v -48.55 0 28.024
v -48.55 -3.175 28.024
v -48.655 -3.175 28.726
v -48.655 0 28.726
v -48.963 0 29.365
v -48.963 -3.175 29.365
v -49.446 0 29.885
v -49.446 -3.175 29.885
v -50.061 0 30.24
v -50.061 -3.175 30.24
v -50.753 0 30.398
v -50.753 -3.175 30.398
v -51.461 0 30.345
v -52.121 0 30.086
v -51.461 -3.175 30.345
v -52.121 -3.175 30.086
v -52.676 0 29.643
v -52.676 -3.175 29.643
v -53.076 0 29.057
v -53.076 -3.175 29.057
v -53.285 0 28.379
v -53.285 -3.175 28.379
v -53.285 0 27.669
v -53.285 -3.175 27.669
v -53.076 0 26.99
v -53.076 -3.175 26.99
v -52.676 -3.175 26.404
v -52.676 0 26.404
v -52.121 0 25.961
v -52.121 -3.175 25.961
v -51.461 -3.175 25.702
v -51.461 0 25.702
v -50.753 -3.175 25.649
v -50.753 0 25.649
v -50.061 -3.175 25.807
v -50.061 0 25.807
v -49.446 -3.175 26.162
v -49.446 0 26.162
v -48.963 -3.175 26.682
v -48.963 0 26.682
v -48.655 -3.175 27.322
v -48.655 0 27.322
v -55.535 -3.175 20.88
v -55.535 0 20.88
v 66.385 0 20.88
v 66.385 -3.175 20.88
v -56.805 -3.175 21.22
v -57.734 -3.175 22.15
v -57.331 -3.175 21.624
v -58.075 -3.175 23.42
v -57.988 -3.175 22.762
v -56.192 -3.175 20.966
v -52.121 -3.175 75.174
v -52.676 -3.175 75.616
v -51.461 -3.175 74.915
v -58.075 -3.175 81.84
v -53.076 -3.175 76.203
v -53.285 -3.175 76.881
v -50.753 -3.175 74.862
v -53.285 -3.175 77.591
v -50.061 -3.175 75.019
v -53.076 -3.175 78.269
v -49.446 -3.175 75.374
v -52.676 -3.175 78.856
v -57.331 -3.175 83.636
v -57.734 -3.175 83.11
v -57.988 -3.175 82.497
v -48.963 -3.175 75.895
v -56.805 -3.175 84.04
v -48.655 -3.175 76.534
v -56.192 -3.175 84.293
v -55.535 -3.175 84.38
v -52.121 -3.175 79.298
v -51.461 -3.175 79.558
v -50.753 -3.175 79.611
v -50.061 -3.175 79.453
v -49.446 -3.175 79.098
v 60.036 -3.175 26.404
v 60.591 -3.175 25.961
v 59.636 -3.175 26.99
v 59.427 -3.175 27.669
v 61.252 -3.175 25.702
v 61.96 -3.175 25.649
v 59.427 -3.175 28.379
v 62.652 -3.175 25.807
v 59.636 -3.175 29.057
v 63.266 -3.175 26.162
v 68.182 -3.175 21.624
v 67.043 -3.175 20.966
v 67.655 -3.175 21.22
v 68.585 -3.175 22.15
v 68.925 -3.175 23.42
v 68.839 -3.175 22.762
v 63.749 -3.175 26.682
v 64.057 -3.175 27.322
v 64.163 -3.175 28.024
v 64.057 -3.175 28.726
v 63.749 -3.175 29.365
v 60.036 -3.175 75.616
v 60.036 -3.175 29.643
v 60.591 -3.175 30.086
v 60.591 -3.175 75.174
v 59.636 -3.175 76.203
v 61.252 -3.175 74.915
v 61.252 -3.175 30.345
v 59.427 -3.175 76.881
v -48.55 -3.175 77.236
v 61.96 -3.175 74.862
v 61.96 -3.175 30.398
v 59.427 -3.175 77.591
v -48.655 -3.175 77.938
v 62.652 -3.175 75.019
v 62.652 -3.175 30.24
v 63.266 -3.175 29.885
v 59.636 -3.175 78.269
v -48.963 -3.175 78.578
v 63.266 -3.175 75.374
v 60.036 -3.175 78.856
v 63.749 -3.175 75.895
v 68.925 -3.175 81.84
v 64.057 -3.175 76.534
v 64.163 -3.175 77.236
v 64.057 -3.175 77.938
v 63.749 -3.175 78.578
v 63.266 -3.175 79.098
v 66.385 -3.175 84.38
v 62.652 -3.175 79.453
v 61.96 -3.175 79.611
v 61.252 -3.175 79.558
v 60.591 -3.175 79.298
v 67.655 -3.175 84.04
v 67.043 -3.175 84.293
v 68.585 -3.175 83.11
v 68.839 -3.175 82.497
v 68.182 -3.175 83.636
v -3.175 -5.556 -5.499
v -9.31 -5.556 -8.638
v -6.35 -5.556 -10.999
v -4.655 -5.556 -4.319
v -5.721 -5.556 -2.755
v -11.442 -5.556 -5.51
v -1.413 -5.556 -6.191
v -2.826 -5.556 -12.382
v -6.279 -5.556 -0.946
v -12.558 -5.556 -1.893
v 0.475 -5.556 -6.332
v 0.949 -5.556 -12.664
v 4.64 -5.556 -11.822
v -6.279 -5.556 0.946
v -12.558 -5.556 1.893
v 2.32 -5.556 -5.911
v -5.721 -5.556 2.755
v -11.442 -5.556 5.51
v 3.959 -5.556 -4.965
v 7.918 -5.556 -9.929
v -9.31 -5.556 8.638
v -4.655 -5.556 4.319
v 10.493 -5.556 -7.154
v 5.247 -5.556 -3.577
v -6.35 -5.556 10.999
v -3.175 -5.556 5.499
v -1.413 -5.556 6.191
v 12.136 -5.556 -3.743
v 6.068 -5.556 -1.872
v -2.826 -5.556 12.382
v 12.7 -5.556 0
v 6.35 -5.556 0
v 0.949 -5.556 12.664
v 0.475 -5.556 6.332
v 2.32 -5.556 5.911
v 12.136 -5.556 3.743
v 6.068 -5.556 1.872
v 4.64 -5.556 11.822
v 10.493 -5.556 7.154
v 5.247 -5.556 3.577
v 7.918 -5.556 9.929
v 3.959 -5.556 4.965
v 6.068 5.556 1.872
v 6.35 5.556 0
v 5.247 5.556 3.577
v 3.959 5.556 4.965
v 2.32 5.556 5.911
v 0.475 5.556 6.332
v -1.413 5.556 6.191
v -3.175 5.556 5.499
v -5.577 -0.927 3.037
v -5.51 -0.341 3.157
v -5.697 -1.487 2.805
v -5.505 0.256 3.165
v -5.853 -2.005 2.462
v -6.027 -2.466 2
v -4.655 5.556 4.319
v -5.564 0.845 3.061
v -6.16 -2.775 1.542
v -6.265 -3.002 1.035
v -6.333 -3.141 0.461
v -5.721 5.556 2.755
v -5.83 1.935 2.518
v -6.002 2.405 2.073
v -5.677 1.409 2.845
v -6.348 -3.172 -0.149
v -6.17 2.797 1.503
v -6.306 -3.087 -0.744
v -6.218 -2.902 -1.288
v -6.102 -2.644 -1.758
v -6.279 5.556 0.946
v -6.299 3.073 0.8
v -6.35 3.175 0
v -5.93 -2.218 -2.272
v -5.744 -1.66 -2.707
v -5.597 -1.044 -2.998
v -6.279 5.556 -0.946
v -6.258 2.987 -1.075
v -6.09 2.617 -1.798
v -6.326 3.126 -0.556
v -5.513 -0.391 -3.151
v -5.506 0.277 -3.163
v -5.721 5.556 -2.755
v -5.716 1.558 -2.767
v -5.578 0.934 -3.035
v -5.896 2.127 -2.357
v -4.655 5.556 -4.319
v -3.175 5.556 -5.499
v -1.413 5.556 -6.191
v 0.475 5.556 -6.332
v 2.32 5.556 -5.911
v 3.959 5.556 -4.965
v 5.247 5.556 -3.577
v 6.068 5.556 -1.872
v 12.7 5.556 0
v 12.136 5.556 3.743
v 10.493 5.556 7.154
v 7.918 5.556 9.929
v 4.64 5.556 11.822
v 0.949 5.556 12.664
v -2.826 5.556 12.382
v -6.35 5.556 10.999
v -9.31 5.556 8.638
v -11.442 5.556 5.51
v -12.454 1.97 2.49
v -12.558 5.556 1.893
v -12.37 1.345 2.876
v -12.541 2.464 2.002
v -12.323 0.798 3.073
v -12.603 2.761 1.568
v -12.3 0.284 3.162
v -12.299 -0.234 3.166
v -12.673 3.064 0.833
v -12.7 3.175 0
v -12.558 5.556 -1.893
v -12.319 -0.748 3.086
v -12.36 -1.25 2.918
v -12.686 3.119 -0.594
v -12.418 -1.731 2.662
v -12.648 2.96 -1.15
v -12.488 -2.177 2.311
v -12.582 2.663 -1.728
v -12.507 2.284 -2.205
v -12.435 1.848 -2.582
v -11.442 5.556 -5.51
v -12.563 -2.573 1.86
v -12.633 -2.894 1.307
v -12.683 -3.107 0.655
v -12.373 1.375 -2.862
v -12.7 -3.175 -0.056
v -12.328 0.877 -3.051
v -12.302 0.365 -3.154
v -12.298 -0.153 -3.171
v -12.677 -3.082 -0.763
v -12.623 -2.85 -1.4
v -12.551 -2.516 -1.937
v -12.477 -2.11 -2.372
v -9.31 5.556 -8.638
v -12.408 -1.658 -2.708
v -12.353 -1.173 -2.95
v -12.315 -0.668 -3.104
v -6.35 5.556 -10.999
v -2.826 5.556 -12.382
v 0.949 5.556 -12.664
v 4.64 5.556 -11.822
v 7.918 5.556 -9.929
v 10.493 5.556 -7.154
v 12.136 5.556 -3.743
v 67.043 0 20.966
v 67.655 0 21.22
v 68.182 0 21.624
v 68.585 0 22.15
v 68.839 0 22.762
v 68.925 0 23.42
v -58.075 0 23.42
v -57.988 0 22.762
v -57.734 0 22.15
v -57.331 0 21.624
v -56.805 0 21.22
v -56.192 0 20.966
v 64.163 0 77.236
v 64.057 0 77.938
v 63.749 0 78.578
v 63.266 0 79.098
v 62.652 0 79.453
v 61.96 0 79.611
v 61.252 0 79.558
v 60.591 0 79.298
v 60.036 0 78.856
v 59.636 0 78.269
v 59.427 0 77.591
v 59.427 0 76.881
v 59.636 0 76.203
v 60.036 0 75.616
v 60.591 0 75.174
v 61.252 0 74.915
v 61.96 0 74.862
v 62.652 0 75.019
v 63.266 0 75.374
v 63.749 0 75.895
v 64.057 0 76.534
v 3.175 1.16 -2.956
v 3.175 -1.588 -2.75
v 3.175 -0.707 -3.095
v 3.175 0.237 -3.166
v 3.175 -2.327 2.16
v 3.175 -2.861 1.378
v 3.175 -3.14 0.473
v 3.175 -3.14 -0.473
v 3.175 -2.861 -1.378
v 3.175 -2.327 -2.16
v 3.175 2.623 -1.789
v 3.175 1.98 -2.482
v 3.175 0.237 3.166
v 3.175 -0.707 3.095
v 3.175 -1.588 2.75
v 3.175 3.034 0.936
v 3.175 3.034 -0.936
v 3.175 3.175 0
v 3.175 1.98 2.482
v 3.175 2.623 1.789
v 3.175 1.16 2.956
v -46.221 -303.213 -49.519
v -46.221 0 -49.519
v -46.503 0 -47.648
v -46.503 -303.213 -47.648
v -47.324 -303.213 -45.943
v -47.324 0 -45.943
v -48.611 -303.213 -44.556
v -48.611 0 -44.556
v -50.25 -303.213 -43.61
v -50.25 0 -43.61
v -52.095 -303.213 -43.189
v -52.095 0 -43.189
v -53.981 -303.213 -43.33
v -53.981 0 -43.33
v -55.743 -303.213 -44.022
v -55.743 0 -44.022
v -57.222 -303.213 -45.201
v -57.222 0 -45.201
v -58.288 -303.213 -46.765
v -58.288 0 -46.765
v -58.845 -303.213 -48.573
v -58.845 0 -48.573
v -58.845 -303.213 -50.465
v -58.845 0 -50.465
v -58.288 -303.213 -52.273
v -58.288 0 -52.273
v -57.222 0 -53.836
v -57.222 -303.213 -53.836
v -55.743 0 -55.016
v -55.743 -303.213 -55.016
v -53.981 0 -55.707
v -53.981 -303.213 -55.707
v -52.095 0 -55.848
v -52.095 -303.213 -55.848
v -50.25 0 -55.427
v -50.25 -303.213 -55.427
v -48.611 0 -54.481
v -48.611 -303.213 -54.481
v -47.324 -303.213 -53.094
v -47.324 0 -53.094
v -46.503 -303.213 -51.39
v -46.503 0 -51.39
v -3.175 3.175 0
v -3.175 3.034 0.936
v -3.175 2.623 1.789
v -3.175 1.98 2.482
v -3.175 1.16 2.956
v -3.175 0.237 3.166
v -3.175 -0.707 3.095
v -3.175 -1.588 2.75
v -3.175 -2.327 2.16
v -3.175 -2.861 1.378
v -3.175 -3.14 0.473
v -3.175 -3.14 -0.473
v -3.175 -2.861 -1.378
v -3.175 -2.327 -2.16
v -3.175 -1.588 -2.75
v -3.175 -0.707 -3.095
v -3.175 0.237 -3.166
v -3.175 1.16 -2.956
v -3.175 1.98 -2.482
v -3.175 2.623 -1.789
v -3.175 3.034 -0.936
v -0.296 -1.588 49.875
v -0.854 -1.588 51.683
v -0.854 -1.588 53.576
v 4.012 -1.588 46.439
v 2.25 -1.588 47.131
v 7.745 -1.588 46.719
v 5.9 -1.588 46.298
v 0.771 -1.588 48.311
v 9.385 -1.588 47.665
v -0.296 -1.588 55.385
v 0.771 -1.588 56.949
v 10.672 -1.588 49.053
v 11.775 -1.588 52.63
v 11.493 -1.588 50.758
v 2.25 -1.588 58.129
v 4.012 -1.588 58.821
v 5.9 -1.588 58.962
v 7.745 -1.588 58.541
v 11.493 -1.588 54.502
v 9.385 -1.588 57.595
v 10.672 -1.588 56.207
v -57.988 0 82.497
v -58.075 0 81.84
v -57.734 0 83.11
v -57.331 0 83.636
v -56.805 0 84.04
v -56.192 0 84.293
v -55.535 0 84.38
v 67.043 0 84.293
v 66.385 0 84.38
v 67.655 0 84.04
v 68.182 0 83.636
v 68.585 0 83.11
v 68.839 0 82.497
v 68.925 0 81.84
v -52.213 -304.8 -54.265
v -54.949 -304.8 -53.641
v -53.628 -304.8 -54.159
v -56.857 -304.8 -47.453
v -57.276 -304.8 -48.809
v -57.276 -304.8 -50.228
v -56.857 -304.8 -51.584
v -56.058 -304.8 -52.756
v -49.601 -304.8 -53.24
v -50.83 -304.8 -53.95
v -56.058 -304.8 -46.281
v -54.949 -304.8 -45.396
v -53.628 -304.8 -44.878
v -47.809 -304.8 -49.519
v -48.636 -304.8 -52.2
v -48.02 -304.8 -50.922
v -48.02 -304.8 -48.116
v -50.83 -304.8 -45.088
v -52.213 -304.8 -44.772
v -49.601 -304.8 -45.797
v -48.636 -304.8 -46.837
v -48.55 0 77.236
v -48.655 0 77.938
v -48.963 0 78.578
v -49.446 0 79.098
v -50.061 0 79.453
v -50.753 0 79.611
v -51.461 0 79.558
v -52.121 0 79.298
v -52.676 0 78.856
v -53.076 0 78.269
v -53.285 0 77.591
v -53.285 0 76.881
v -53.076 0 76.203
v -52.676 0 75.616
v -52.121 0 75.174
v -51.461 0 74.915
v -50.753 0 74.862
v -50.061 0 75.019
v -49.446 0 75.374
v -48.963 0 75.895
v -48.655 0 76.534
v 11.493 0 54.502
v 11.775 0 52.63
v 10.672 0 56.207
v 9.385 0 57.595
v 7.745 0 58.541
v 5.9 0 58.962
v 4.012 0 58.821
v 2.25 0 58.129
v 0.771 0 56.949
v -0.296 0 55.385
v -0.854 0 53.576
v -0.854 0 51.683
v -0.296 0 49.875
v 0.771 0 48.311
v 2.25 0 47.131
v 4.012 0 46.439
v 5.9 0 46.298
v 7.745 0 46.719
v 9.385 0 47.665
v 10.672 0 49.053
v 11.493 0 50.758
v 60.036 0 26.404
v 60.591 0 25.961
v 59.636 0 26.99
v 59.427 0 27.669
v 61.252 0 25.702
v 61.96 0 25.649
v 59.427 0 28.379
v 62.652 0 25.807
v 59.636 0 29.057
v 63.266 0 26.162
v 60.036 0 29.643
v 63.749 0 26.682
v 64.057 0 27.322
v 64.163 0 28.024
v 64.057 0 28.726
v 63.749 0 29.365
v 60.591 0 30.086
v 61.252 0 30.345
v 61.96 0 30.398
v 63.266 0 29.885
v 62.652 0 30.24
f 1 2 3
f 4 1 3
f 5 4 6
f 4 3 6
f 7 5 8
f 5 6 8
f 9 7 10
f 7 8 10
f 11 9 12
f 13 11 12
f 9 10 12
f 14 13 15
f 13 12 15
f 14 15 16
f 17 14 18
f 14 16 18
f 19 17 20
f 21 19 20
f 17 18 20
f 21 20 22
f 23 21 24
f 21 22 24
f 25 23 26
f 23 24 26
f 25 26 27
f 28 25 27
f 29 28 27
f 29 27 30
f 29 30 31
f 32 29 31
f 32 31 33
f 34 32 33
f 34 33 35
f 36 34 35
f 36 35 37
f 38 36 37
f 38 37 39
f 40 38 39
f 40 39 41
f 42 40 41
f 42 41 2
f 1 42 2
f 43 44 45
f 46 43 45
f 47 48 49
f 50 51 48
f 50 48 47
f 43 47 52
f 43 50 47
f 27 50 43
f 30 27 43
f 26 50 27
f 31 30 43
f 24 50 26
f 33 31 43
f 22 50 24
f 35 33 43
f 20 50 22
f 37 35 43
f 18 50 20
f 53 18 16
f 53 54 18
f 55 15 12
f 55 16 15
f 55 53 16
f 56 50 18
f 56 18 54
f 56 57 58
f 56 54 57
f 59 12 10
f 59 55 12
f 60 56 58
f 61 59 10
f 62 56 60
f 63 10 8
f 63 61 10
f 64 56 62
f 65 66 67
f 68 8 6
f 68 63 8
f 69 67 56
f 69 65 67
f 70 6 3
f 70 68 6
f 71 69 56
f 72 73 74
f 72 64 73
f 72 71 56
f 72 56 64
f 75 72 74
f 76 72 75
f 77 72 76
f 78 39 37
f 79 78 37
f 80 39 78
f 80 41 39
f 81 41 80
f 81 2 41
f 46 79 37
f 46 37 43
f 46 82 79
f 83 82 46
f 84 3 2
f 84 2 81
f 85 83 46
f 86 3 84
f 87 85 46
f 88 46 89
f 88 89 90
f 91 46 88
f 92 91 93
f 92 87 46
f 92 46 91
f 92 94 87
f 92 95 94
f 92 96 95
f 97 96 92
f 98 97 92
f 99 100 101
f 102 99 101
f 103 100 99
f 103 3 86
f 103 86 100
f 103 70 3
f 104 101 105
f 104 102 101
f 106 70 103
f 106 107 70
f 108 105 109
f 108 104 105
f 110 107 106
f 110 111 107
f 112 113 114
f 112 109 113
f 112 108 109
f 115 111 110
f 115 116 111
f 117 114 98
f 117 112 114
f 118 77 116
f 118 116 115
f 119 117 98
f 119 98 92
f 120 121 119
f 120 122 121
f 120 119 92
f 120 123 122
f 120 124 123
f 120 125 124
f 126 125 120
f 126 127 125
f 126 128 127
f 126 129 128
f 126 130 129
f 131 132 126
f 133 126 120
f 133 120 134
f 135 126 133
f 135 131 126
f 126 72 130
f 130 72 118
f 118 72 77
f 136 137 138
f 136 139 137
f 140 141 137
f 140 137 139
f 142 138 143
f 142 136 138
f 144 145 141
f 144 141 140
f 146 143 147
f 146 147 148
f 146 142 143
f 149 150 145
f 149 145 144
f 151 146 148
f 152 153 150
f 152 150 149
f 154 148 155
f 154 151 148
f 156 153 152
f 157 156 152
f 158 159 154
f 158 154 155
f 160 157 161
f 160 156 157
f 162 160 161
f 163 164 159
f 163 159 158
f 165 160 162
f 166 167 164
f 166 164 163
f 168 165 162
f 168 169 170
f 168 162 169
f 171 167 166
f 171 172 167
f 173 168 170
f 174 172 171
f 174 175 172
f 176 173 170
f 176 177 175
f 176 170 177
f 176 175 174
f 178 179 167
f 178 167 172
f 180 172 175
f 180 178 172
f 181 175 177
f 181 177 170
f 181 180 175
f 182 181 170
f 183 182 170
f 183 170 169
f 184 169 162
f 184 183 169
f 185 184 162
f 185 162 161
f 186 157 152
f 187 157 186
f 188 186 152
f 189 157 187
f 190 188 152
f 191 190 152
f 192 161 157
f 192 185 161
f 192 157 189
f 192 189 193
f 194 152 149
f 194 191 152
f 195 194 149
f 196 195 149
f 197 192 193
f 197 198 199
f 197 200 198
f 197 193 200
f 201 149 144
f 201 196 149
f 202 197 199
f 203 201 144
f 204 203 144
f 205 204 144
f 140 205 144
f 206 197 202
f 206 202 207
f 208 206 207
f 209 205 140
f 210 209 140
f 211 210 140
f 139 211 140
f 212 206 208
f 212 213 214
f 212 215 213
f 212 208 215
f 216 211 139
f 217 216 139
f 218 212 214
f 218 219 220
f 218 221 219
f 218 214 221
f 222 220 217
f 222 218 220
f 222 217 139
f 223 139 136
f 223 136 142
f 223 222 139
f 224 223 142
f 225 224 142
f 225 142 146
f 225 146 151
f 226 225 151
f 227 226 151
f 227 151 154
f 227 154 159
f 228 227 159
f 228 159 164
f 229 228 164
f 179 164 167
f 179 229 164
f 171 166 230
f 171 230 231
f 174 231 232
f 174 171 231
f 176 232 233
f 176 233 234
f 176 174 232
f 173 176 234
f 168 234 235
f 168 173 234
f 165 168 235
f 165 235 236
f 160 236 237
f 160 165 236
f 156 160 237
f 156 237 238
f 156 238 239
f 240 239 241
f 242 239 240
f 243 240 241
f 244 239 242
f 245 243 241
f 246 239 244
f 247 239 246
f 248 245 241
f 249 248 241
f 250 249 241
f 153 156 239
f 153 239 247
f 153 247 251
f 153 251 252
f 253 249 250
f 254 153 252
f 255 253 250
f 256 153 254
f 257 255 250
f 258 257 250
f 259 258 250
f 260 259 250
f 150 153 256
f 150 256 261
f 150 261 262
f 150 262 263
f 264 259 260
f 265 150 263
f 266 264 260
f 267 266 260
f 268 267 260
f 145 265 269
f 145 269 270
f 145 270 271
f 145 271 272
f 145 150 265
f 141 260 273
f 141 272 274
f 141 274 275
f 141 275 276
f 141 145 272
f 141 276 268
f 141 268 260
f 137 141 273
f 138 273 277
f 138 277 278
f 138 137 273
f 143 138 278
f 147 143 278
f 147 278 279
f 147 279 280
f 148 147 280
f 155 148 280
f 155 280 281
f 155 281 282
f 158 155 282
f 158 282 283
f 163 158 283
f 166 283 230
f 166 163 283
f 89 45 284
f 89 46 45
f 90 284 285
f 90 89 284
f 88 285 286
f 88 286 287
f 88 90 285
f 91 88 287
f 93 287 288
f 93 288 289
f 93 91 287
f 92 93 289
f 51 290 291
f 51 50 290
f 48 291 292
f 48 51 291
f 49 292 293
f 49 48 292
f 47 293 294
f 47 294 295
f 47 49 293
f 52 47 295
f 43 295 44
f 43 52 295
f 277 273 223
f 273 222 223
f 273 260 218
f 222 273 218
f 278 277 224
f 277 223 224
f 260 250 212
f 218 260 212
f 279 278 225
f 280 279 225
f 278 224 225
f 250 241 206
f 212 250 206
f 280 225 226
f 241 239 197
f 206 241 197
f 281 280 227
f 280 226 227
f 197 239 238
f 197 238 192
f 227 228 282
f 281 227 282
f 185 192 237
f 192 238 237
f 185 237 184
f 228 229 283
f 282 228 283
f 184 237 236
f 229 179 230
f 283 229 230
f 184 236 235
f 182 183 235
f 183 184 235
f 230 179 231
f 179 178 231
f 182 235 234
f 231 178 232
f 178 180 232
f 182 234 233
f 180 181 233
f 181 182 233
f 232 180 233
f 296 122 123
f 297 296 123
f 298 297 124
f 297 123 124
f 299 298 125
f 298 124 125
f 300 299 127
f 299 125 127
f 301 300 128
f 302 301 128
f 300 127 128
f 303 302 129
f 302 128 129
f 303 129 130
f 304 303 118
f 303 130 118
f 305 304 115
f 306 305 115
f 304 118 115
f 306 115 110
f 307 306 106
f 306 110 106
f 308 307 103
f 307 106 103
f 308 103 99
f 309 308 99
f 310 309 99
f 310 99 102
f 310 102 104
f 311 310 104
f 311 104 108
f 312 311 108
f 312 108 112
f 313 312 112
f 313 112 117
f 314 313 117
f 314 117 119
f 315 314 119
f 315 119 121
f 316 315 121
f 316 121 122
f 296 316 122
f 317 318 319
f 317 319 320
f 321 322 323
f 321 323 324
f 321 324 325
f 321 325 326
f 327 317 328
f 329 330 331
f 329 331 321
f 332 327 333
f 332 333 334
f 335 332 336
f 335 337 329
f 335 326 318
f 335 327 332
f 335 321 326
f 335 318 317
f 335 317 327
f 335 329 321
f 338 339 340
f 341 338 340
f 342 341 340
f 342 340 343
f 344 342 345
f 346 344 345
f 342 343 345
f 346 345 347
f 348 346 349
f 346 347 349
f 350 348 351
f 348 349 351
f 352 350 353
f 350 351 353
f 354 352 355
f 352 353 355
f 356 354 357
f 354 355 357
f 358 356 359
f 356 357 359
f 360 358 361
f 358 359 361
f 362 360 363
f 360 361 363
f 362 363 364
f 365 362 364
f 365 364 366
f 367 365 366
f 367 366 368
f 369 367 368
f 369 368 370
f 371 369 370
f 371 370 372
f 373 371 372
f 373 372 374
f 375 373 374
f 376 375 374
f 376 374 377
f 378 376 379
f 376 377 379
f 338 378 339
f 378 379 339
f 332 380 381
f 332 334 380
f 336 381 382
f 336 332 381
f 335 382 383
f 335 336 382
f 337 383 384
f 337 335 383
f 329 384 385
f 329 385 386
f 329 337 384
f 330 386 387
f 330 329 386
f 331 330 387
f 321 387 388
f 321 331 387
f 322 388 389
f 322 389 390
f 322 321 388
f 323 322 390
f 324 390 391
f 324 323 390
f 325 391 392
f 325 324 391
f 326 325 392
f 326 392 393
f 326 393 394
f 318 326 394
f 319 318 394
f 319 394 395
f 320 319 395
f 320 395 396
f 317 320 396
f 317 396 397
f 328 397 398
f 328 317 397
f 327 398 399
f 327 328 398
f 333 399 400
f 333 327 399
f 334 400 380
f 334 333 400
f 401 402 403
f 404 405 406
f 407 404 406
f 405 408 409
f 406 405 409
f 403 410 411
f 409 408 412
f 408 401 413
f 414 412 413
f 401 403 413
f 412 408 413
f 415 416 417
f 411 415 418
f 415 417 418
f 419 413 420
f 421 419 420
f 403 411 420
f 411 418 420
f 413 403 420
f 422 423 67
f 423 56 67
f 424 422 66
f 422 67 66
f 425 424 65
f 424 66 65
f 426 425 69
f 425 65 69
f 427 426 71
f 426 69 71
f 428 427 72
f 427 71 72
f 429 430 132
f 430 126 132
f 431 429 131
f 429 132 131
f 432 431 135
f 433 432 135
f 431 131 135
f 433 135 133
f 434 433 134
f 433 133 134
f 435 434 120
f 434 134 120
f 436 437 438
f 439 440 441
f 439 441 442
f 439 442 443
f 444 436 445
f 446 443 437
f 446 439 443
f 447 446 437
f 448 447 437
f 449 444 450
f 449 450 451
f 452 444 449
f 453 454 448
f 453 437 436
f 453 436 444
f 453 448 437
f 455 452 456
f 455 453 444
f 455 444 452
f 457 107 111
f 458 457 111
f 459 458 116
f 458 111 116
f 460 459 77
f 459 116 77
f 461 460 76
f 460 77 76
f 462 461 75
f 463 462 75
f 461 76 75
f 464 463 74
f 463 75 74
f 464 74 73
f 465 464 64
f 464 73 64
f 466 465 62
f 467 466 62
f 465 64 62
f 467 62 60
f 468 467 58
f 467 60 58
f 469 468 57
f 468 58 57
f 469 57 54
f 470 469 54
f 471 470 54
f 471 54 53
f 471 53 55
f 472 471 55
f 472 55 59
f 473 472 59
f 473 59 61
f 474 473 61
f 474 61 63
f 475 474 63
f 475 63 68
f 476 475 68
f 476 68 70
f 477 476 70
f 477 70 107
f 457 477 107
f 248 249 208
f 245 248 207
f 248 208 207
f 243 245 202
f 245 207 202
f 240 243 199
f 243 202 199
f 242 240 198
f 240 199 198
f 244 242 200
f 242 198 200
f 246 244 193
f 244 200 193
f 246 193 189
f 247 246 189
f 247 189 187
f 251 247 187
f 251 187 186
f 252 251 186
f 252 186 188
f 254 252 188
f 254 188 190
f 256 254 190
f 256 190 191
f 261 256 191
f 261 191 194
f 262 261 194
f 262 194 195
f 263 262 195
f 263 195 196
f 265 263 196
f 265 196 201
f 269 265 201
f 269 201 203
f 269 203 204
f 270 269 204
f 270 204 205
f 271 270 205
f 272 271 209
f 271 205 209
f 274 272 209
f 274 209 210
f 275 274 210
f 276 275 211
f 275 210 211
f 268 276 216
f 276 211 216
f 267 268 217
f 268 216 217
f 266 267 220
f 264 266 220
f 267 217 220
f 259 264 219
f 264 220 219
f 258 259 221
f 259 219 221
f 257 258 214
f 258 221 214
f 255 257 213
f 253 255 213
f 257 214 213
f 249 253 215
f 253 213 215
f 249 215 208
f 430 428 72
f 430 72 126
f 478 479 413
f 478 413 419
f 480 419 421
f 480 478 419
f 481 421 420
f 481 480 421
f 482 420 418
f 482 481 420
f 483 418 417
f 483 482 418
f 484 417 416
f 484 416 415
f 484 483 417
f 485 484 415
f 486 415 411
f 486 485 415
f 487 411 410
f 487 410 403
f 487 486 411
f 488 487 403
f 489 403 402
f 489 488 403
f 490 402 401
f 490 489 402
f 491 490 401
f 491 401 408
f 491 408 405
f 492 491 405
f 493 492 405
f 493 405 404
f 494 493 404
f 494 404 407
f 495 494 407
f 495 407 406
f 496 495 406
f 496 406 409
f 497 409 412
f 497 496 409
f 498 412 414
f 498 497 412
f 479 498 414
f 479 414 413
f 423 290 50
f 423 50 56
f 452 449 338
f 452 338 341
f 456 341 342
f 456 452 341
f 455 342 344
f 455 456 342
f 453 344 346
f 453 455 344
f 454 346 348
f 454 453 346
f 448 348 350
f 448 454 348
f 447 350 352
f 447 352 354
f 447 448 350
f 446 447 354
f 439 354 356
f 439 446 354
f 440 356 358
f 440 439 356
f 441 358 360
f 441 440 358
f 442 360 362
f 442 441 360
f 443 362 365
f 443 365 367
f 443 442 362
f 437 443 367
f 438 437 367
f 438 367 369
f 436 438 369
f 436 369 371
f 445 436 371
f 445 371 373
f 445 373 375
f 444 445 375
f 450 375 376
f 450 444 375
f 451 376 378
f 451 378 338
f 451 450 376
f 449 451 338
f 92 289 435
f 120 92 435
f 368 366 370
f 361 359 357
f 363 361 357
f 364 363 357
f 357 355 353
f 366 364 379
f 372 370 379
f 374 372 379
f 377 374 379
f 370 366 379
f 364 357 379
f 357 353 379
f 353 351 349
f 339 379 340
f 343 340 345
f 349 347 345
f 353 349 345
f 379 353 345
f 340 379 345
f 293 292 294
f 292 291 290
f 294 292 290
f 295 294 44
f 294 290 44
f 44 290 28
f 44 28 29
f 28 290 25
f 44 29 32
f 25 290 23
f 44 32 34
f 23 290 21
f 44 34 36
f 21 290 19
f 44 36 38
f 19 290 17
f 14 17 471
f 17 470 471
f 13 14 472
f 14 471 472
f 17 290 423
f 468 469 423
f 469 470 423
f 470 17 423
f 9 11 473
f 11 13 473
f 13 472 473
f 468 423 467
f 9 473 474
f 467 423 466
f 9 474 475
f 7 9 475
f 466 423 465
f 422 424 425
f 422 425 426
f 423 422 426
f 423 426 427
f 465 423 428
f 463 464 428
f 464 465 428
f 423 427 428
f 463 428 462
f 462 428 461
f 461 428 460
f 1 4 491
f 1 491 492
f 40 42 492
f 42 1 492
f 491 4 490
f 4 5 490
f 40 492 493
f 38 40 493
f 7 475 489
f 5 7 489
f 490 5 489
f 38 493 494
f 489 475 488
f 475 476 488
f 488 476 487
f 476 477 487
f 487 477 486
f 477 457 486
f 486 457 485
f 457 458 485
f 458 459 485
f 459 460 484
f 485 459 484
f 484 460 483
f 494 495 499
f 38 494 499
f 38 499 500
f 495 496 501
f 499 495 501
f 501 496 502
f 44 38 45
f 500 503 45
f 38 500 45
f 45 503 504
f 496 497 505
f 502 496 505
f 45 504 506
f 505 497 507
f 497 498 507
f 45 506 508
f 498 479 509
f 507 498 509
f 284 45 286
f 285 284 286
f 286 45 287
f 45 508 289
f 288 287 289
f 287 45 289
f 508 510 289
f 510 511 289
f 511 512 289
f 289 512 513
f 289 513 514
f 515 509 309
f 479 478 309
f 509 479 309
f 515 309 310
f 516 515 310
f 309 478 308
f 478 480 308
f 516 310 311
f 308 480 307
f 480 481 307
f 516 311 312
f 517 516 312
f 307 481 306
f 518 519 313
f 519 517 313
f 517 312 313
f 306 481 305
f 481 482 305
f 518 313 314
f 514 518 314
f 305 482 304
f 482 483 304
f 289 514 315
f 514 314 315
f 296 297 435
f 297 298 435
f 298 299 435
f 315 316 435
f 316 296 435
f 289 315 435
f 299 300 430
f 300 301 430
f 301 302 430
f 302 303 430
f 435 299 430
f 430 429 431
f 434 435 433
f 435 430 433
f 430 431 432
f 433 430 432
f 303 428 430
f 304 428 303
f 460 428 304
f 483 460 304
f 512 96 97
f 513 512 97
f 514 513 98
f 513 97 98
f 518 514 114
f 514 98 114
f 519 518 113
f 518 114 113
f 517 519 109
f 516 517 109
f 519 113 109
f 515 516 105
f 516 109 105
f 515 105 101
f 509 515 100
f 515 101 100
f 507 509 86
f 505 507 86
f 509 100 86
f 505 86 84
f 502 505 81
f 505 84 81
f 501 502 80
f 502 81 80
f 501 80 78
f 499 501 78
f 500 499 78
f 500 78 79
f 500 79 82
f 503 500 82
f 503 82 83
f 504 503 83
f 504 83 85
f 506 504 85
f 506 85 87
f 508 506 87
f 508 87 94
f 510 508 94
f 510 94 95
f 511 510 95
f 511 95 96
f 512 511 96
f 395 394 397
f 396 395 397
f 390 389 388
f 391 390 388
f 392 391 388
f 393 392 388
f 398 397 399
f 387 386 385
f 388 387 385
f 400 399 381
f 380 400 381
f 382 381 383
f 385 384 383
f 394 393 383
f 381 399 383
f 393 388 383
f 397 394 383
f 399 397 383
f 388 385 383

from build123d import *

# Parameters (mm, degrees)
F0_W      = 127
F0_H      = 63.5
F0_R      = 6.35
F1_DEPTH  = 3.175
F2_DEPTH  = 1.5875
F4_R      = 2.54
F3_R      = 2.38125
F5_DEPTH  = 3.176
F6_R      = 6.34746
F7_DEPTH  = 304.8
F8_SIZE   = 1.5875
F9_R      = 12.7
F9_R_2    = 6.35
F10_DEPTH = 5.55625
F12_D     = 6.35
F12_DEPTH = 12.701
F13_R     = 3.175
F14_DEPTH = 3.175


with BuildPart() as f1:
    # F0 (on Front) → F1 (new body)
    with BuildSketch(Plane.XZ):
        with Locations((5.4254960269, 52.6298845063)):
            Rectangle(F0_W, F0_H)
        with Locations((5.4254960269, 52.6298845063)):
            Circle(F0_R, mode=Mode.SUBTRACT)
        with Locations((5.4254960269, 52.6298845063)):
            Circle(F0_R)
    extrude(amount=F1_DEPTH)

    # F0 (on Front) → F2 (cut)
    with BuildSketch(Plane.XZ):
        with Locations((5.4254960269, 52.6298845063)):
            Circle(F0_R)
    extrude(amount=F2_DEPTH, mode=Mode.SUBTRACT)

    # F4
    f4_edges = [f1.edges().sort_by_distance(p)[0] for p in [
        (-58.074504, -1.5875, 84.379885),
        (-58.074504, -1.5875, 20.879885),
        (68.925496, -1.5875, 84.379885),
        (68.925496, -1.5875, 20.879885),
    ]]
    fillet(f4_edges, radius=F4_R)

    # F3 (on face) → F5 (cut, through all)
    with BuildSketch(Plane.XZ.offset(3.175)):
        with Locations((-50.9307539731, 77.2361345063)):
            Circle(F3_R)
        with Locations((61.7817460269, 77.2361345063)):
            Circle(F3_R)
        with Locations((-50.9307539731, 28.0236345063)):
            Circle(F3_R)
        with Locations((61.7817460269, 28.0236345063)):
            Circle(F3_R)
    extrude(amount=-F5_DEPTH, mode=Mode.SUBTRACT)


with BuildPart() as f7:
    # F6 (on Front) → F7 (new body)
    with BuildSketch(Plane.XZ):
        with Locations((-52.5688901544, -49.5186410844)):
            Circle(F6_R)
    extrude(amount=F7_DEPTH)

    # F8
    f8_edges = [f7.edges().sort_by_distance(p)[0] for p in [
        (-58.91635, -304.8, -49.518641),
    ]]
    chamfer(f8_edges, length=F8_SIZE)


with BuildPart() as f10:
    # F9 (on Front) → F10 (new body, symmetric)
    with BuildSketch(Plane.XZ):
        Circle(F9_R)
        Circle(F9_R_2, mode=Mode.SUBTRACT)
    extrude(amount=F10_DEPTH, both=True)

    # F12 (through all, one way)
    with BuildSketch(Plane.YZ):
        with Locations((0, 0)):
            Circle(F12_D / 2)
    extrude(amount=-F12_DEPTH, mode=Mode.SUBTRACT)


with BuildPart() as f14:
    # F13 (on Right) → F14 (new body, symmetric)
    with BuildSketch(Plane.YZ):
        Circle(F13_R)
    extrude(amount=F14_DEPTH, both=True)


solid = Compound([f1.part, f7.part, f10.part, f14.part])
